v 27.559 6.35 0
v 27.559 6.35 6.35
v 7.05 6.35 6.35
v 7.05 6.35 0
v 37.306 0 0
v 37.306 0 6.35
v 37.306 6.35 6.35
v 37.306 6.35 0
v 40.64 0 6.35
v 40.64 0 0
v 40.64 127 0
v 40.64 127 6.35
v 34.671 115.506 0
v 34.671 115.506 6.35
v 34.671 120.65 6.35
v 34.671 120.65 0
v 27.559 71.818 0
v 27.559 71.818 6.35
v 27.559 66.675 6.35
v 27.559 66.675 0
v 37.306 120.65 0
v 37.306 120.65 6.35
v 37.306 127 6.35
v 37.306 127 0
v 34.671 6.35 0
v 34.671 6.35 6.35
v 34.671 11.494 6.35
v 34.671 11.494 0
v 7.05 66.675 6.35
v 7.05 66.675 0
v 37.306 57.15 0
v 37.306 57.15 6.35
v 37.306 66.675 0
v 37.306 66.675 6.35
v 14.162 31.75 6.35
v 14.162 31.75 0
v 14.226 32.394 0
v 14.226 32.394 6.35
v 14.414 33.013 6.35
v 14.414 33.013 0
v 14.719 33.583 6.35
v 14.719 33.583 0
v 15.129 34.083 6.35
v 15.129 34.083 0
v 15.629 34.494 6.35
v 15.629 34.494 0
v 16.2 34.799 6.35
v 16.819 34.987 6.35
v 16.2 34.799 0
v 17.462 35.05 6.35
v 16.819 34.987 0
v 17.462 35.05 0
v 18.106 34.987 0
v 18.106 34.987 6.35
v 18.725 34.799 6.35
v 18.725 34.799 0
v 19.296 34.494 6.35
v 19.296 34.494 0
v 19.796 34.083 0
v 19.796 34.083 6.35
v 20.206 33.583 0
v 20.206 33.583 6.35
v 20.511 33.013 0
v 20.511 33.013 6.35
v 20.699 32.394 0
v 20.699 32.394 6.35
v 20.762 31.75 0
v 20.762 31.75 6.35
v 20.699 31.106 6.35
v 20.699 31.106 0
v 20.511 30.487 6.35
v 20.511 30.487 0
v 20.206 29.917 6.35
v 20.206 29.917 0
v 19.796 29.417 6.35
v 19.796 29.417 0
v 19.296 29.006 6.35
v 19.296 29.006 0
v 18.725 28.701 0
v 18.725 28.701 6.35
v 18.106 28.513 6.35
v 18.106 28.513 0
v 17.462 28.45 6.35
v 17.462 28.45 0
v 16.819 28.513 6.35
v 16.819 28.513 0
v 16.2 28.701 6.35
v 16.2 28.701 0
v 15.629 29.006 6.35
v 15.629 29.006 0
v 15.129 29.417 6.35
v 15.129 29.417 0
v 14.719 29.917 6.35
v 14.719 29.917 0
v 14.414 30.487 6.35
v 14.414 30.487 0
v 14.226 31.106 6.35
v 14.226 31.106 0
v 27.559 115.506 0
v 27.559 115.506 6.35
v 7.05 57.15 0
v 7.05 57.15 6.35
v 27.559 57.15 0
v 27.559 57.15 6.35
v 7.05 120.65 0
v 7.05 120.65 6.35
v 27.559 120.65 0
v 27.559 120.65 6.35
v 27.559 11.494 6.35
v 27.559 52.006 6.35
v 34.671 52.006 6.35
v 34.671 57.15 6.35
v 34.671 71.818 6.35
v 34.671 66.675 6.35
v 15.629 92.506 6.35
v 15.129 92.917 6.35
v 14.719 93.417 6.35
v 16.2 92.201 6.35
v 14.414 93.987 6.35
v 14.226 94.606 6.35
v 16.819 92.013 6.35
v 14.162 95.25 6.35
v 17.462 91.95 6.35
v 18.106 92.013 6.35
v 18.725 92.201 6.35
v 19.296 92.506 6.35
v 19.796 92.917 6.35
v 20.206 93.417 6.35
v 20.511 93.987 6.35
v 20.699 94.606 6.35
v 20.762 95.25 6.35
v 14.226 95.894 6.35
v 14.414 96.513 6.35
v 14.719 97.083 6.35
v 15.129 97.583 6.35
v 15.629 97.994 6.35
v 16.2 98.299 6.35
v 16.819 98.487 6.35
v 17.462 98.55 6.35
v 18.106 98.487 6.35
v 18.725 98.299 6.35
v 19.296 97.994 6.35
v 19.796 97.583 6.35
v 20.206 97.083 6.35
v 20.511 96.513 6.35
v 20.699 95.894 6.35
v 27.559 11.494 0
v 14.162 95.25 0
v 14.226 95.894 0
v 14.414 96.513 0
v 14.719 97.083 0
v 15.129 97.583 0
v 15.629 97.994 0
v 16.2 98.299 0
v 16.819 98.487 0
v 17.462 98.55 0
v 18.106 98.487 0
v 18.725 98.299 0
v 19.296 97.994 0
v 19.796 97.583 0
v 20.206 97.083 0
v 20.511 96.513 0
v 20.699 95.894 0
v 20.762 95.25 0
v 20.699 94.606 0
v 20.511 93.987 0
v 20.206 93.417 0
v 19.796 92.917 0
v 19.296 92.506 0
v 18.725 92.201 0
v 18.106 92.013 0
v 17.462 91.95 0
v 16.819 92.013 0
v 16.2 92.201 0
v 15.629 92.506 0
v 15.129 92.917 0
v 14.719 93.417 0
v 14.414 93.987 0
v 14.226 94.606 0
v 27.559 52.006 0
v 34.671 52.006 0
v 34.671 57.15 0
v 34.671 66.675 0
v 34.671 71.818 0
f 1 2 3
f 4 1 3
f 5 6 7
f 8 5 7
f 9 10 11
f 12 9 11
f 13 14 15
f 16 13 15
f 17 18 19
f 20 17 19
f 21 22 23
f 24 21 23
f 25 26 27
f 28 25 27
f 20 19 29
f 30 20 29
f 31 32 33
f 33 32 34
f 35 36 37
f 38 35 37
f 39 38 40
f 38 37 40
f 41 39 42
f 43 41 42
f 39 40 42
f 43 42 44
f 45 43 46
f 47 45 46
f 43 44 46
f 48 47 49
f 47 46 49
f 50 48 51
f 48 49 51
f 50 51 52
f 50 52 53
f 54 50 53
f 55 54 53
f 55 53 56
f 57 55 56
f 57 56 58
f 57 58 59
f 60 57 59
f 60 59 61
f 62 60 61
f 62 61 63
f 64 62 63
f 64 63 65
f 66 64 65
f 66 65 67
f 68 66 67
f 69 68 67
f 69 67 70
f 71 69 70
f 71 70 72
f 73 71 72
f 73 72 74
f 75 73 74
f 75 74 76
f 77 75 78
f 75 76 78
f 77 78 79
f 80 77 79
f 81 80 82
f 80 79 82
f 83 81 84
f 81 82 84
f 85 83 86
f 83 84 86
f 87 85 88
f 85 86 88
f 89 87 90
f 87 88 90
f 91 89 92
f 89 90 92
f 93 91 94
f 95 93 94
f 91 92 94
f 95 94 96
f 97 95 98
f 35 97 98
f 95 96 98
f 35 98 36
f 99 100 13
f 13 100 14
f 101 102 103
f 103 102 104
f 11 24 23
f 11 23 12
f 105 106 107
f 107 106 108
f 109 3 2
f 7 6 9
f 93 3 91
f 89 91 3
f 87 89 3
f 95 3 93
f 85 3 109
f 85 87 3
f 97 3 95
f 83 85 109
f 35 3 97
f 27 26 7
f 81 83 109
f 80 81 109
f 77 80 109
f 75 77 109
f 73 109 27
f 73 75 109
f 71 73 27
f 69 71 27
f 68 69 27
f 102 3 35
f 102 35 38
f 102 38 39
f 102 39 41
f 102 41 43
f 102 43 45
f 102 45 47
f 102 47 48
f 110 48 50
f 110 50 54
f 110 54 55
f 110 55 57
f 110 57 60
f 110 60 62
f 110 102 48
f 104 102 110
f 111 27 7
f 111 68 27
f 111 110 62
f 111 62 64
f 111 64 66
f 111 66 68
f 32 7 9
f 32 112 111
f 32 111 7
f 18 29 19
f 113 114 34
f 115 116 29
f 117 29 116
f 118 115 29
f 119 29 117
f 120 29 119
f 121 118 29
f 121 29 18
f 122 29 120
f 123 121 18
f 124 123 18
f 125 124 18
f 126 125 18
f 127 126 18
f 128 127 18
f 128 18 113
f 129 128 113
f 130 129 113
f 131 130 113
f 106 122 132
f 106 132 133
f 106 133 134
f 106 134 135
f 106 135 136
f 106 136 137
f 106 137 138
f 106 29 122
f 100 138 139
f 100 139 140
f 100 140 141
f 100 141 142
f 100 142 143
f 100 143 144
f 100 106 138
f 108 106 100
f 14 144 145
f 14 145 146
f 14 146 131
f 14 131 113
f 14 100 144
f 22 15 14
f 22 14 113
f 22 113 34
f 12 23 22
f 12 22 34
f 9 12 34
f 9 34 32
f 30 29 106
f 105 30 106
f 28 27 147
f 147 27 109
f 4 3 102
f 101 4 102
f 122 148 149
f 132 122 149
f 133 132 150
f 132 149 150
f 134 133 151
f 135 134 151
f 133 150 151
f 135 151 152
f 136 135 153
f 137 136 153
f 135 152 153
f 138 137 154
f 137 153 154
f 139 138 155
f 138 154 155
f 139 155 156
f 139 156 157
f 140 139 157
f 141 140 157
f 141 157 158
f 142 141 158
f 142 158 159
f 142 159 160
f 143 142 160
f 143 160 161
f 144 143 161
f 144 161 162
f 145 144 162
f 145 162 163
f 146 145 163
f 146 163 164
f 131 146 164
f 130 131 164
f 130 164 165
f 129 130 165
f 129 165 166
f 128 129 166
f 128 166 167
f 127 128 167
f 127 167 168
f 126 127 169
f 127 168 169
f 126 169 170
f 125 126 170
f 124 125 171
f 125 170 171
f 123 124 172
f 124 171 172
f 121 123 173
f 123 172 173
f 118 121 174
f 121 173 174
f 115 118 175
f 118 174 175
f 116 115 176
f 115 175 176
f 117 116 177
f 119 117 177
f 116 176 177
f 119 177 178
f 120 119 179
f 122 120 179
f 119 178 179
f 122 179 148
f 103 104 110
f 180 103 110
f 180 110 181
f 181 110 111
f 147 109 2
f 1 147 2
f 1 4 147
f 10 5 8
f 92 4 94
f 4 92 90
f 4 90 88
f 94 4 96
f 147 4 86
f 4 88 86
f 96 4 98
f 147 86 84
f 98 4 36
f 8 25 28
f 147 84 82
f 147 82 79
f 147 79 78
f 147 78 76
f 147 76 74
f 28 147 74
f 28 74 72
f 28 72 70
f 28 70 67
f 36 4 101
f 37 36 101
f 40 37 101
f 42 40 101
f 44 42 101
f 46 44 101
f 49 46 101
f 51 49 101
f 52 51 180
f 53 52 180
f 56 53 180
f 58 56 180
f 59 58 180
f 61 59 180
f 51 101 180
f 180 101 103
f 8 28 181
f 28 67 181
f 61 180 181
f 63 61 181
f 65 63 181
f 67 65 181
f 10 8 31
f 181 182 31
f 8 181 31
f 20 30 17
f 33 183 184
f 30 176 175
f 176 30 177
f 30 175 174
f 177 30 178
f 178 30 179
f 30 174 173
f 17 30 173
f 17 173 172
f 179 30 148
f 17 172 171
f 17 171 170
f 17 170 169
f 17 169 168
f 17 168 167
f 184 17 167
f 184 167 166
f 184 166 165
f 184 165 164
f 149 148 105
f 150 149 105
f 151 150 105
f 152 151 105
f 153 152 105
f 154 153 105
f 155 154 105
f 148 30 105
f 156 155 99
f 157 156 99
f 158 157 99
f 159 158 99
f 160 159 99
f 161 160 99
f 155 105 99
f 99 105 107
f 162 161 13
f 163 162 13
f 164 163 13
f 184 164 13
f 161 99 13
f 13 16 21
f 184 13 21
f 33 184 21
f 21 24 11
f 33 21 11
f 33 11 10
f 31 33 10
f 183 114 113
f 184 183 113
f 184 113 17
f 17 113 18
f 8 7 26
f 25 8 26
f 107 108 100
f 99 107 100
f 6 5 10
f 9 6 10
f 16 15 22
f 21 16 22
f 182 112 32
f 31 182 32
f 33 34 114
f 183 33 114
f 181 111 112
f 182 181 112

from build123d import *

# Parameters (mm, degrees)
SKETCH2_W               = 40.64
SKETCH2_H               = 127
BOSS_EXTRUDE1_DEPTH     = 6.35
M6_CLEARANCE_HOLE1_D    = 6.6
SKETCH5_W               = 7.0505
SKETCH5_H               = 127
CUT_EXTRUDE1_DEPTH      = 1
CUT_EXTRUDE1_DEPTH_BACK = 7.35
SKETCH6_W               = 27.8745
SKETCH6_H               = 3.175
CUT_EXTRUDE2_DEPTH      = 7.35
SKETCH7_W               = 6.35
SKETCH7_H               = 4.7625
CUT_EXTRUDE3_DEPTH      = 7.35


with BuildPart() as part:
    # Sketch2 → Boss-Extrude1 (new body)
    with BuildSketch(Plane.XY):
        with Locations((20.32, 63.5)):
            Rectangle(SKETCH2_W, SKETCH2_H)
    extrude(amount=BOSS_EXTRUDE1_DEPTH)

    # M6 Clearance Hole1 (through all)
    with Locations(Plane.XY.offset(6.35)):
        with Locations((17.4625, 31.75), (17.4625, 95.25)):
            Hole(M6_CLEARANCE_HOLE1_D / 2)

    # Sketch5 → Cut-Extrude1 (cut, two sides)
    with BuildSketch(Plane.XY.offset(6.35)) as cut_extrude1_sk:
        with Locations((3.52525, 63.5)):
            Rectangle(SKETCH5_W, SKETCH5_H)
    extrude(amount=CUT_EXTRUDE1_DEPTH, mode=Mode.SUBTRACT)
    extrude(cut_extrude1_sk.sketch, amount=-CUT_EXTRUDE1_DEPTH_BACK, mode=Mode.SUBTRACT)

    # Sketch6 → Cut-Extrude2 (cut, through all)
    with BuildSketch(Plane.XY.offset(6.35)):
        Polygon((7.0505, 123.825), (7.0505, 120.65), (37.30625, 120.65), (37.30625, 127), (34.925, 127), (34.925, 123.825), align=None)
        with Locations((20.98775, 125.4125)):
            Rectangle(SKETCH6_W, SKETCH6_H)
        Polygon((37.30625, 66.675), (7.0505, 66.675), (7.0505, 63.5), (34.925, 63.5), (34.925, 60.325), (7.0505, 60.325), (7.0505, 57.15), (37.30625, 57.15), align=None)
        with Locations((20.98775, 61.9125)):
            Rectangle(SKETCH6_W, SKETCH6_H)
        Polygon((37.30625, 0), (37.30625, 6.35), (7.0505, 6.35), (7.0505, 3.175), (34.925, 3.175), (34.925, 0), align=None)
        with Locations((20.98775, 1.5875)):
            Rectangle(SKETCH6_W, SKETCH6_H)
    extrude(amount=-CUT_EXTRUDE2_DEPTH, mode=Mode.SUBTRACT)

    # Sketch7 → Cut-Extrude3 (cut, through all)
    with BuildSketch(Plane.XY.offset(6.35)):
        with Locations((31.115, 8.73125)):
            Rectangle(SKETCH7_W, SKETCH7_H)
        Polygon((27.94, 11.1125), (34.29, 11.1125), (34.29, 6.35), (34.671, 6.35), (34.671, 11.4935), (27.559, 11.4935), (27.559, 6.35), (27.94, 6.35), align=None)
        Polygon((34.671, 6.35), (34.29, 6.35), (27.94, 6.35), (27.559, 6.35), (27.559, 5.969), (34.671, 5.969), align=None)
        with Locations((31.115, 54.76875)):
            Rectangle(SKETCH7_W, SKETCH7_H)
        Polygon((34.671, 57.15), (34.29, 57.15), (34.29, 52.3875), (27.94, 52.3875), (27.94, 57.15), (27.559, 57.15), (27.559, 52.0065), (34.671, 52.0065), align=None)
        Polygon((27.94, 57.15), (34.29, 57.15), (34.671, 57.15), (34.671, 57.531), (27.559, 57.531), (27.559, 57.15), align=None)
        Polygon((34.671, 66.675), (34.29, 66.675), (27.94, 66.675), (27.559, 66.675), (27.559, 66.294), (34.671, 66.294), align=None)
        with Locations((31.115, 69.05625)):
            Rectangle(SKETCH7_W, SKETCH7_H)
        Polygon((27.94, 71.4375), (34.29, 71.4375), (34.29, 66.675), (34.671, 66.675), (34.671, 71.8185), (27.559, 71.8185), (27.559, 66.675), (27.94, 66.675), align=None)
        with Locations((31.115, 118.26875)):
            Rectangle(SKETCH7_W, SKETCH7_H)
        Polygon((27.559, 115.5065), (34.671, 115.5065), (34.671, 120.65), (34.29, 120.65), (34.29, 115.8875), (27.94, 115.8875), (27.94, 120.65), (27.559, 120.65), align=None)
        Polygon((34.29, 120.65), (34.671, 120.65), (34.671, 121.031), (27.559, 121.031), (27.559, 120.65), (27.94, 120.65), align=None)
    extrude(amount=-CUT_EXTRUDE3_DEPTH, mode=Mode.SUBTRACT)


solid = part.part
